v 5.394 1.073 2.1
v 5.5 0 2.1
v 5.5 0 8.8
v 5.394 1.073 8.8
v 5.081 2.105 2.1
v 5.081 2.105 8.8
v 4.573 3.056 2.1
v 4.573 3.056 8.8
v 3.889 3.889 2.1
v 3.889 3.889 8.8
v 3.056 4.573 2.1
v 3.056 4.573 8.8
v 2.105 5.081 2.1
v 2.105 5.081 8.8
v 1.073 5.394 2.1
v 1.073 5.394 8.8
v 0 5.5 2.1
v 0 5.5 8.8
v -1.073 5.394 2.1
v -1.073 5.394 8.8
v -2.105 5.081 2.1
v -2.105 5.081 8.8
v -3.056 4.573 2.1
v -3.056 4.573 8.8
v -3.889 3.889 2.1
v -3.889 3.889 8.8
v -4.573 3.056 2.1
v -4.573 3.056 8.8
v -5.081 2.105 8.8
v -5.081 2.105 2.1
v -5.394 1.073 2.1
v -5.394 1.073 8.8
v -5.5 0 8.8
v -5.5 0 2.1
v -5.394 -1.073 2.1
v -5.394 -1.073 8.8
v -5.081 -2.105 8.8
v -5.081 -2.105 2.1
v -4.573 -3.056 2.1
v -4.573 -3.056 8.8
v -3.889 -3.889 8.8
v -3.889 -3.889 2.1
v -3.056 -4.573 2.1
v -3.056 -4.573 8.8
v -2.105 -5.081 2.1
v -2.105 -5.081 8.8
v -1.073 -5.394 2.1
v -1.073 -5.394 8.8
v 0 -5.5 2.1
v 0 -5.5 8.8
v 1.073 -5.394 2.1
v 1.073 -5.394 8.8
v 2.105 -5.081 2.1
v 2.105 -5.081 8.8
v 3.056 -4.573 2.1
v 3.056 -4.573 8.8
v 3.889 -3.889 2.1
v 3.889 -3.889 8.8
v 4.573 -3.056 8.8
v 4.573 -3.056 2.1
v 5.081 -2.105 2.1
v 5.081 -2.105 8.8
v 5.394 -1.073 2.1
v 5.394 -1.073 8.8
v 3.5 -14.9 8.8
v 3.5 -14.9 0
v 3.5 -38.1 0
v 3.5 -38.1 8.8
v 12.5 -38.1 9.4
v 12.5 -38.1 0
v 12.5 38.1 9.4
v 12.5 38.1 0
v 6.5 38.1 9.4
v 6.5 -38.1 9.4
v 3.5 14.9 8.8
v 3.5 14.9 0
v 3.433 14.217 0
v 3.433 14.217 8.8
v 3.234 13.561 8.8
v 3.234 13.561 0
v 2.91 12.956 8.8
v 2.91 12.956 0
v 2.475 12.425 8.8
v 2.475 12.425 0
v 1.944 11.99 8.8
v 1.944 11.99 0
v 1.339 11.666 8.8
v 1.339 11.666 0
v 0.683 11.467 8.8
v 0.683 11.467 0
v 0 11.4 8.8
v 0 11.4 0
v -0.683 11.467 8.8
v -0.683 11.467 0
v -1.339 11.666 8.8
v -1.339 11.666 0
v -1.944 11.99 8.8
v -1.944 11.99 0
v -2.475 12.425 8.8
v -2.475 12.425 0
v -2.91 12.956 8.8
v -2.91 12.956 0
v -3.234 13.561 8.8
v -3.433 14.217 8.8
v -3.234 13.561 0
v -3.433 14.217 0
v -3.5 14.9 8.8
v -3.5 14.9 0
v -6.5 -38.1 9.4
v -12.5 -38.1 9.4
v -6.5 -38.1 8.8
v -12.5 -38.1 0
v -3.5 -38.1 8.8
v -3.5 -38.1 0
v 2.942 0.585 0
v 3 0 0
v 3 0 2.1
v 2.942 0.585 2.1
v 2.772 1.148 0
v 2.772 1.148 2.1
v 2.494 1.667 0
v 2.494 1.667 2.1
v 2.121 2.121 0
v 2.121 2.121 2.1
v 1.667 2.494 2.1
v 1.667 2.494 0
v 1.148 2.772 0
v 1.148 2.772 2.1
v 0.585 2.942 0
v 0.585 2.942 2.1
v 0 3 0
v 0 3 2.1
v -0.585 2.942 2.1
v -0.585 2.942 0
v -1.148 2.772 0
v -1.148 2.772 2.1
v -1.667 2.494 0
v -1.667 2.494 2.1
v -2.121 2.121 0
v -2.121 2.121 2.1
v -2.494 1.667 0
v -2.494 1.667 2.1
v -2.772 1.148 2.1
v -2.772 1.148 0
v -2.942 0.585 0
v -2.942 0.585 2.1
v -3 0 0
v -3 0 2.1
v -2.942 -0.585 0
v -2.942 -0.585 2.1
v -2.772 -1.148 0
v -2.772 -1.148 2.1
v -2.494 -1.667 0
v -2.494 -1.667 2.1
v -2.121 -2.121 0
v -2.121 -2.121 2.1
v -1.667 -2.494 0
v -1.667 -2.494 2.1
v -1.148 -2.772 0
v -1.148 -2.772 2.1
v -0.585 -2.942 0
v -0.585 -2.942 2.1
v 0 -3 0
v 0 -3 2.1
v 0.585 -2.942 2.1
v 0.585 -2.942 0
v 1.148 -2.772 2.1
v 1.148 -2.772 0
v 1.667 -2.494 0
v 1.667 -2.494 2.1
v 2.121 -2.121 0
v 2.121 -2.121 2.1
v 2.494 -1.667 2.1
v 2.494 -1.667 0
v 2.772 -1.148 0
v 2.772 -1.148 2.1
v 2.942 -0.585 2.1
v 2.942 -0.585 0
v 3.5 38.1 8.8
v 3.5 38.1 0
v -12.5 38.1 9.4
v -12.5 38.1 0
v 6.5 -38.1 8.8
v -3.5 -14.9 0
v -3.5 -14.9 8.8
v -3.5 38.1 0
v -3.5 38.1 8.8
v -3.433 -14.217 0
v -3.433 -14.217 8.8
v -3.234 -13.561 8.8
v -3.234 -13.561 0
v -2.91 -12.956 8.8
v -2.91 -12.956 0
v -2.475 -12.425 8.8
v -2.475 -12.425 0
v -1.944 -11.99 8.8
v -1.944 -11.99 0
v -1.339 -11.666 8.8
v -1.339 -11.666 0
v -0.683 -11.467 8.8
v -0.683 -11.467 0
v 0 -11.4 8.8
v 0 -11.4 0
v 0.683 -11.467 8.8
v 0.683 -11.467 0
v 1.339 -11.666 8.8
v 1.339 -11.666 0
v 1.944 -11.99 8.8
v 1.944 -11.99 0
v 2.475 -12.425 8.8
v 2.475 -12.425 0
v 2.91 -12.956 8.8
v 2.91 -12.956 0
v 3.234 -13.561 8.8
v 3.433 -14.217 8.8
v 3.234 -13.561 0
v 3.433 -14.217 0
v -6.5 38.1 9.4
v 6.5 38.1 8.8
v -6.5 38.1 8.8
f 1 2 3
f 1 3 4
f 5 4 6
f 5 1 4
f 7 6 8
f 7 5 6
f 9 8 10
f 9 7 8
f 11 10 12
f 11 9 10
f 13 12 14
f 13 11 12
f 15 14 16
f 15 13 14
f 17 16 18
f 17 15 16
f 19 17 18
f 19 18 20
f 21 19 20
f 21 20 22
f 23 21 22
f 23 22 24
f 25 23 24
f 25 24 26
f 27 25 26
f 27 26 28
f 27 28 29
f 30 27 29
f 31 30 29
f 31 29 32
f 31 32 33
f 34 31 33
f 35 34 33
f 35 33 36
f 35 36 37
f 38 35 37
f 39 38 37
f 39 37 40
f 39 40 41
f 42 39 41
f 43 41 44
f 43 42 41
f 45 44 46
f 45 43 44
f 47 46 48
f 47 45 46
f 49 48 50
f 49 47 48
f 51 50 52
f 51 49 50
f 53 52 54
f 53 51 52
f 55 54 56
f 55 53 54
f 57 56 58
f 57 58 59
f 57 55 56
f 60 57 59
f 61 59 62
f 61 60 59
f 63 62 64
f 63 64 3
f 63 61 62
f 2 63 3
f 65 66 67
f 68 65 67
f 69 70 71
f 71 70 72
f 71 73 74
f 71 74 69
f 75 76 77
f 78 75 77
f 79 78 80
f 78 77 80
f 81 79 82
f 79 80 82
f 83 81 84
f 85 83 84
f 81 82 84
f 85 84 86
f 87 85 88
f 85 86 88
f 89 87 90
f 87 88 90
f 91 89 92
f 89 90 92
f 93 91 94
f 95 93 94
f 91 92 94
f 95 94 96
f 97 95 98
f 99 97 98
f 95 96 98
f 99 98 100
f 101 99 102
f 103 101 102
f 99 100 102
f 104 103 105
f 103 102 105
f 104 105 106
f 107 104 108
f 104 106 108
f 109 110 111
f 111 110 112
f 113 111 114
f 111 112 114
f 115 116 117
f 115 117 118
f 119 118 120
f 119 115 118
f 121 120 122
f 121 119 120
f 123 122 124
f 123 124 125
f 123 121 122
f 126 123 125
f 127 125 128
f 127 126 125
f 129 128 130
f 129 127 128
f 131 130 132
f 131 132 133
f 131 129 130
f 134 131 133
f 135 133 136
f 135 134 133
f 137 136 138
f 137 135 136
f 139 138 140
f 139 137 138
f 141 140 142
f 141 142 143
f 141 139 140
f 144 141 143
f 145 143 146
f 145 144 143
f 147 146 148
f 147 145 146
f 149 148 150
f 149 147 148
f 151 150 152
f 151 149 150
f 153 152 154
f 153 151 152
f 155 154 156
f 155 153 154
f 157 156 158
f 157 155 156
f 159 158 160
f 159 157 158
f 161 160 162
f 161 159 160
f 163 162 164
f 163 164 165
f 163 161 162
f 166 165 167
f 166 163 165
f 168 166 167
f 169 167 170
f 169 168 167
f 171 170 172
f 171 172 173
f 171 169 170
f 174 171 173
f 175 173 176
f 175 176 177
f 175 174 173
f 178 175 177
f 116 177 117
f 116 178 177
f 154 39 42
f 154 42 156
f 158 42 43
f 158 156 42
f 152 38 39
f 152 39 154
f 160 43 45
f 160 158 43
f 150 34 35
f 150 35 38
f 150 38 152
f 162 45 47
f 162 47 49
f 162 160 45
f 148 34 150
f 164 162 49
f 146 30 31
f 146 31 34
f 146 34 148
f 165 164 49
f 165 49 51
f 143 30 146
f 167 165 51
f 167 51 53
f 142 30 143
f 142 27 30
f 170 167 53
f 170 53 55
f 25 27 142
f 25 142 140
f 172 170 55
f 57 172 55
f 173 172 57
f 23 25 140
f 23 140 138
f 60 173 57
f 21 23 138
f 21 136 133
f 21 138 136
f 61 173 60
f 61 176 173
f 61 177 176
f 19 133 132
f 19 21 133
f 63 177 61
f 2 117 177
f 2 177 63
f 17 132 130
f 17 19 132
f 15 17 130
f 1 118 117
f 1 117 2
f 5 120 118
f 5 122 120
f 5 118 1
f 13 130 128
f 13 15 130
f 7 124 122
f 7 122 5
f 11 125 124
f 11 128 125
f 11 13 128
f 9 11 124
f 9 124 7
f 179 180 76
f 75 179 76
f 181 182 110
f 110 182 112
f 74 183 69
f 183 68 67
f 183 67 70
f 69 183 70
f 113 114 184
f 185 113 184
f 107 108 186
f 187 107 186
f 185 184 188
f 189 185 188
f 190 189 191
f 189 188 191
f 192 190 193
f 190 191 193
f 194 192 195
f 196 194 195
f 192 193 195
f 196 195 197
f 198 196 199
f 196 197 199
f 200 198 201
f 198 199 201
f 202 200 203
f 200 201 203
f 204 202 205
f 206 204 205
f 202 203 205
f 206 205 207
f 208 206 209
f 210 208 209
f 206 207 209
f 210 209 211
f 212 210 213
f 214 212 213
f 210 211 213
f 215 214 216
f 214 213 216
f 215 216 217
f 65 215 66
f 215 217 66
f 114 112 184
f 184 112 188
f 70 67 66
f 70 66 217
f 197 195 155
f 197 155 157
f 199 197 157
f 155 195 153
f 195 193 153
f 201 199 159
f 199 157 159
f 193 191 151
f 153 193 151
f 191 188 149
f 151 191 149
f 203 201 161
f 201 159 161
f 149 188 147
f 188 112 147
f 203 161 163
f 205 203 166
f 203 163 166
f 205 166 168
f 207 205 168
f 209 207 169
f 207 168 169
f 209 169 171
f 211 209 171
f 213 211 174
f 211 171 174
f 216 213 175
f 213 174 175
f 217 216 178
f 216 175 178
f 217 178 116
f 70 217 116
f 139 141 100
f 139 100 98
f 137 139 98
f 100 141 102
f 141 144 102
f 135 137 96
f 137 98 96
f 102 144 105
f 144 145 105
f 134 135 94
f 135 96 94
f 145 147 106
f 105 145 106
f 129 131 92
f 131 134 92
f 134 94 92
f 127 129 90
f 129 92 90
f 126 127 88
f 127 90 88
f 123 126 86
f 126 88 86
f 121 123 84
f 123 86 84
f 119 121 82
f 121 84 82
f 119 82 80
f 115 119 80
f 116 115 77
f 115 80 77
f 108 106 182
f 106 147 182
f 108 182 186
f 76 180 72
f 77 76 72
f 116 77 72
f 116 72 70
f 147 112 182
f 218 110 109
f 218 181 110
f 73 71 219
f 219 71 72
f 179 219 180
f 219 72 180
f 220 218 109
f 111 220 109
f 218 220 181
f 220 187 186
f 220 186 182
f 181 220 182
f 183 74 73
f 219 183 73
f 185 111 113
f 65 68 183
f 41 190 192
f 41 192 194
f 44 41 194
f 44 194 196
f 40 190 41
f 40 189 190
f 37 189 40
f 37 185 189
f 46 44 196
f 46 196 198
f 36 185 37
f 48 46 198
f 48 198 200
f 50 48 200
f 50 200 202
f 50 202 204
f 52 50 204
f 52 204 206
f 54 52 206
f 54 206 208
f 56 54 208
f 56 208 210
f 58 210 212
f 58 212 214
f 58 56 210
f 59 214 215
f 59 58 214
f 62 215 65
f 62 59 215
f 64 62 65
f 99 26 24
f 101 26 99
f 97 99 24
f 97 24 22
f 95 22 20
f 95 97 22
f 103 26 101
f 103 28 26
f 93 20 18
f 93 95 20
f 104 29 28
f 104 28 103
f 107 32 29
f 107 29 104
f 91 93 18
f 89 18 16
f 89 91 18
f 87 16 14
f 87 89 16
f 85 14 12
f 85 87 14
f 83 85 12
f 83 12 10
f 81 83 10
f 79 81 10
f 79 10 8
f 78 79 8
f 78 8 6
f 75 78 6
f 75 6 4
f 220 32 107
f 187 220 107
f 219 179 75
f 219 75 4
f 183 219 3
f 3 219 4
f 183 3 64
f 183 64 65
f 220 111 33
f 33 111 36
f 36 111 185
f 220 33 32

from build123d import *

# Parameters (mm, degrees)
F0_R     = 5.5
F1_DEPTH = 9.4
F0_R_2   = 3
F2_DEPTH = 2.1
F3_R     = 5.5
F4_DEPTH = 0.6


with BuildPart() as f1:
    # F0 (on Top) → F1 (new body)
    with BuildSketch(Plane.XY):
        with BuildLine():
            Line((3.5, -38.1), (12.5, -38.1))
            Line((12.5, -38.1), (12.5, 38.1))
            Line((12.5, 38.1), (3.5, 38.1))
            Line((3.5, 38.1), (3.5, 14.9))
            ThreePointArc((3.5, 14.9), (0, 11.4), (-3.5, 14.9))
            Line((-3.5, 14.9), (-3.5, 38.1))
            Line((-3.5, 38.1), (-12.5, 38.1))
            Line((-12.5, 38.1), (-12.5, -38.1))
            Line((-12.5, -38.1), (-3.5, -38.1))
            Line((-3.5, -38.1), (-3.5, -14.9))
            ThreePointArc((-3.5, -14.9), (0, -11.4), (3.5, -14.9))
            Line((3.5, -14.9), (3.5, -38.1))
        make_face()
        Circle(F0_R, mode=Mode.SUBTRACT)
    extrude(amount=F1_DEPTH)

    # F0 (on Top) → F2 (join)
    with BuildSketch(Plane.XY):
        Circle(F0_R)
        Circle(F0_R_2, mode=Mode.SUBTRACT)
    extrude(amount=F2_DEPTH)

    # F3 (on face) → F4 (cut)
    with BuildSketch(Plane.XY.offset(9.4)):
        with BuildLine():
            Line((6.5, -38.1), (6.5, 38.1))
            Line((6.5, 38.1), (3.5, 38.1))
            Line((3.5, 38.1), (3.5, 14.9))
            ThreePointArc((3.5, 14.9), (0, 11.4), (-3.5, 14.9))
            Line((-3.5, 14.9), (-3.5, 38.1))
            Line((-3.5, 38.1), (-6.5, 38.1))
            Line((-6.5, 38.1), (-6.5, -38.1))
            Line((-6.5, -38.1), (-3.5, -38.1))
            Line((-3.5, -38.1), (-3.5, -14.9))
            ThreePointArc((-3.5, -14.9), (0, -11.4), (3.5, -14.9))
            Line((3.5, -14.9), (3.5, -38.1))
            Line((3.5, -38.1), (6.5, -38.1))
        make_face()
        Circle(F3_R, mode=Mode.SUBTRACT)
    extrude(amount=-F4_DEPTH, mode=Mode.SUBTRACT)


solid = f1.part
